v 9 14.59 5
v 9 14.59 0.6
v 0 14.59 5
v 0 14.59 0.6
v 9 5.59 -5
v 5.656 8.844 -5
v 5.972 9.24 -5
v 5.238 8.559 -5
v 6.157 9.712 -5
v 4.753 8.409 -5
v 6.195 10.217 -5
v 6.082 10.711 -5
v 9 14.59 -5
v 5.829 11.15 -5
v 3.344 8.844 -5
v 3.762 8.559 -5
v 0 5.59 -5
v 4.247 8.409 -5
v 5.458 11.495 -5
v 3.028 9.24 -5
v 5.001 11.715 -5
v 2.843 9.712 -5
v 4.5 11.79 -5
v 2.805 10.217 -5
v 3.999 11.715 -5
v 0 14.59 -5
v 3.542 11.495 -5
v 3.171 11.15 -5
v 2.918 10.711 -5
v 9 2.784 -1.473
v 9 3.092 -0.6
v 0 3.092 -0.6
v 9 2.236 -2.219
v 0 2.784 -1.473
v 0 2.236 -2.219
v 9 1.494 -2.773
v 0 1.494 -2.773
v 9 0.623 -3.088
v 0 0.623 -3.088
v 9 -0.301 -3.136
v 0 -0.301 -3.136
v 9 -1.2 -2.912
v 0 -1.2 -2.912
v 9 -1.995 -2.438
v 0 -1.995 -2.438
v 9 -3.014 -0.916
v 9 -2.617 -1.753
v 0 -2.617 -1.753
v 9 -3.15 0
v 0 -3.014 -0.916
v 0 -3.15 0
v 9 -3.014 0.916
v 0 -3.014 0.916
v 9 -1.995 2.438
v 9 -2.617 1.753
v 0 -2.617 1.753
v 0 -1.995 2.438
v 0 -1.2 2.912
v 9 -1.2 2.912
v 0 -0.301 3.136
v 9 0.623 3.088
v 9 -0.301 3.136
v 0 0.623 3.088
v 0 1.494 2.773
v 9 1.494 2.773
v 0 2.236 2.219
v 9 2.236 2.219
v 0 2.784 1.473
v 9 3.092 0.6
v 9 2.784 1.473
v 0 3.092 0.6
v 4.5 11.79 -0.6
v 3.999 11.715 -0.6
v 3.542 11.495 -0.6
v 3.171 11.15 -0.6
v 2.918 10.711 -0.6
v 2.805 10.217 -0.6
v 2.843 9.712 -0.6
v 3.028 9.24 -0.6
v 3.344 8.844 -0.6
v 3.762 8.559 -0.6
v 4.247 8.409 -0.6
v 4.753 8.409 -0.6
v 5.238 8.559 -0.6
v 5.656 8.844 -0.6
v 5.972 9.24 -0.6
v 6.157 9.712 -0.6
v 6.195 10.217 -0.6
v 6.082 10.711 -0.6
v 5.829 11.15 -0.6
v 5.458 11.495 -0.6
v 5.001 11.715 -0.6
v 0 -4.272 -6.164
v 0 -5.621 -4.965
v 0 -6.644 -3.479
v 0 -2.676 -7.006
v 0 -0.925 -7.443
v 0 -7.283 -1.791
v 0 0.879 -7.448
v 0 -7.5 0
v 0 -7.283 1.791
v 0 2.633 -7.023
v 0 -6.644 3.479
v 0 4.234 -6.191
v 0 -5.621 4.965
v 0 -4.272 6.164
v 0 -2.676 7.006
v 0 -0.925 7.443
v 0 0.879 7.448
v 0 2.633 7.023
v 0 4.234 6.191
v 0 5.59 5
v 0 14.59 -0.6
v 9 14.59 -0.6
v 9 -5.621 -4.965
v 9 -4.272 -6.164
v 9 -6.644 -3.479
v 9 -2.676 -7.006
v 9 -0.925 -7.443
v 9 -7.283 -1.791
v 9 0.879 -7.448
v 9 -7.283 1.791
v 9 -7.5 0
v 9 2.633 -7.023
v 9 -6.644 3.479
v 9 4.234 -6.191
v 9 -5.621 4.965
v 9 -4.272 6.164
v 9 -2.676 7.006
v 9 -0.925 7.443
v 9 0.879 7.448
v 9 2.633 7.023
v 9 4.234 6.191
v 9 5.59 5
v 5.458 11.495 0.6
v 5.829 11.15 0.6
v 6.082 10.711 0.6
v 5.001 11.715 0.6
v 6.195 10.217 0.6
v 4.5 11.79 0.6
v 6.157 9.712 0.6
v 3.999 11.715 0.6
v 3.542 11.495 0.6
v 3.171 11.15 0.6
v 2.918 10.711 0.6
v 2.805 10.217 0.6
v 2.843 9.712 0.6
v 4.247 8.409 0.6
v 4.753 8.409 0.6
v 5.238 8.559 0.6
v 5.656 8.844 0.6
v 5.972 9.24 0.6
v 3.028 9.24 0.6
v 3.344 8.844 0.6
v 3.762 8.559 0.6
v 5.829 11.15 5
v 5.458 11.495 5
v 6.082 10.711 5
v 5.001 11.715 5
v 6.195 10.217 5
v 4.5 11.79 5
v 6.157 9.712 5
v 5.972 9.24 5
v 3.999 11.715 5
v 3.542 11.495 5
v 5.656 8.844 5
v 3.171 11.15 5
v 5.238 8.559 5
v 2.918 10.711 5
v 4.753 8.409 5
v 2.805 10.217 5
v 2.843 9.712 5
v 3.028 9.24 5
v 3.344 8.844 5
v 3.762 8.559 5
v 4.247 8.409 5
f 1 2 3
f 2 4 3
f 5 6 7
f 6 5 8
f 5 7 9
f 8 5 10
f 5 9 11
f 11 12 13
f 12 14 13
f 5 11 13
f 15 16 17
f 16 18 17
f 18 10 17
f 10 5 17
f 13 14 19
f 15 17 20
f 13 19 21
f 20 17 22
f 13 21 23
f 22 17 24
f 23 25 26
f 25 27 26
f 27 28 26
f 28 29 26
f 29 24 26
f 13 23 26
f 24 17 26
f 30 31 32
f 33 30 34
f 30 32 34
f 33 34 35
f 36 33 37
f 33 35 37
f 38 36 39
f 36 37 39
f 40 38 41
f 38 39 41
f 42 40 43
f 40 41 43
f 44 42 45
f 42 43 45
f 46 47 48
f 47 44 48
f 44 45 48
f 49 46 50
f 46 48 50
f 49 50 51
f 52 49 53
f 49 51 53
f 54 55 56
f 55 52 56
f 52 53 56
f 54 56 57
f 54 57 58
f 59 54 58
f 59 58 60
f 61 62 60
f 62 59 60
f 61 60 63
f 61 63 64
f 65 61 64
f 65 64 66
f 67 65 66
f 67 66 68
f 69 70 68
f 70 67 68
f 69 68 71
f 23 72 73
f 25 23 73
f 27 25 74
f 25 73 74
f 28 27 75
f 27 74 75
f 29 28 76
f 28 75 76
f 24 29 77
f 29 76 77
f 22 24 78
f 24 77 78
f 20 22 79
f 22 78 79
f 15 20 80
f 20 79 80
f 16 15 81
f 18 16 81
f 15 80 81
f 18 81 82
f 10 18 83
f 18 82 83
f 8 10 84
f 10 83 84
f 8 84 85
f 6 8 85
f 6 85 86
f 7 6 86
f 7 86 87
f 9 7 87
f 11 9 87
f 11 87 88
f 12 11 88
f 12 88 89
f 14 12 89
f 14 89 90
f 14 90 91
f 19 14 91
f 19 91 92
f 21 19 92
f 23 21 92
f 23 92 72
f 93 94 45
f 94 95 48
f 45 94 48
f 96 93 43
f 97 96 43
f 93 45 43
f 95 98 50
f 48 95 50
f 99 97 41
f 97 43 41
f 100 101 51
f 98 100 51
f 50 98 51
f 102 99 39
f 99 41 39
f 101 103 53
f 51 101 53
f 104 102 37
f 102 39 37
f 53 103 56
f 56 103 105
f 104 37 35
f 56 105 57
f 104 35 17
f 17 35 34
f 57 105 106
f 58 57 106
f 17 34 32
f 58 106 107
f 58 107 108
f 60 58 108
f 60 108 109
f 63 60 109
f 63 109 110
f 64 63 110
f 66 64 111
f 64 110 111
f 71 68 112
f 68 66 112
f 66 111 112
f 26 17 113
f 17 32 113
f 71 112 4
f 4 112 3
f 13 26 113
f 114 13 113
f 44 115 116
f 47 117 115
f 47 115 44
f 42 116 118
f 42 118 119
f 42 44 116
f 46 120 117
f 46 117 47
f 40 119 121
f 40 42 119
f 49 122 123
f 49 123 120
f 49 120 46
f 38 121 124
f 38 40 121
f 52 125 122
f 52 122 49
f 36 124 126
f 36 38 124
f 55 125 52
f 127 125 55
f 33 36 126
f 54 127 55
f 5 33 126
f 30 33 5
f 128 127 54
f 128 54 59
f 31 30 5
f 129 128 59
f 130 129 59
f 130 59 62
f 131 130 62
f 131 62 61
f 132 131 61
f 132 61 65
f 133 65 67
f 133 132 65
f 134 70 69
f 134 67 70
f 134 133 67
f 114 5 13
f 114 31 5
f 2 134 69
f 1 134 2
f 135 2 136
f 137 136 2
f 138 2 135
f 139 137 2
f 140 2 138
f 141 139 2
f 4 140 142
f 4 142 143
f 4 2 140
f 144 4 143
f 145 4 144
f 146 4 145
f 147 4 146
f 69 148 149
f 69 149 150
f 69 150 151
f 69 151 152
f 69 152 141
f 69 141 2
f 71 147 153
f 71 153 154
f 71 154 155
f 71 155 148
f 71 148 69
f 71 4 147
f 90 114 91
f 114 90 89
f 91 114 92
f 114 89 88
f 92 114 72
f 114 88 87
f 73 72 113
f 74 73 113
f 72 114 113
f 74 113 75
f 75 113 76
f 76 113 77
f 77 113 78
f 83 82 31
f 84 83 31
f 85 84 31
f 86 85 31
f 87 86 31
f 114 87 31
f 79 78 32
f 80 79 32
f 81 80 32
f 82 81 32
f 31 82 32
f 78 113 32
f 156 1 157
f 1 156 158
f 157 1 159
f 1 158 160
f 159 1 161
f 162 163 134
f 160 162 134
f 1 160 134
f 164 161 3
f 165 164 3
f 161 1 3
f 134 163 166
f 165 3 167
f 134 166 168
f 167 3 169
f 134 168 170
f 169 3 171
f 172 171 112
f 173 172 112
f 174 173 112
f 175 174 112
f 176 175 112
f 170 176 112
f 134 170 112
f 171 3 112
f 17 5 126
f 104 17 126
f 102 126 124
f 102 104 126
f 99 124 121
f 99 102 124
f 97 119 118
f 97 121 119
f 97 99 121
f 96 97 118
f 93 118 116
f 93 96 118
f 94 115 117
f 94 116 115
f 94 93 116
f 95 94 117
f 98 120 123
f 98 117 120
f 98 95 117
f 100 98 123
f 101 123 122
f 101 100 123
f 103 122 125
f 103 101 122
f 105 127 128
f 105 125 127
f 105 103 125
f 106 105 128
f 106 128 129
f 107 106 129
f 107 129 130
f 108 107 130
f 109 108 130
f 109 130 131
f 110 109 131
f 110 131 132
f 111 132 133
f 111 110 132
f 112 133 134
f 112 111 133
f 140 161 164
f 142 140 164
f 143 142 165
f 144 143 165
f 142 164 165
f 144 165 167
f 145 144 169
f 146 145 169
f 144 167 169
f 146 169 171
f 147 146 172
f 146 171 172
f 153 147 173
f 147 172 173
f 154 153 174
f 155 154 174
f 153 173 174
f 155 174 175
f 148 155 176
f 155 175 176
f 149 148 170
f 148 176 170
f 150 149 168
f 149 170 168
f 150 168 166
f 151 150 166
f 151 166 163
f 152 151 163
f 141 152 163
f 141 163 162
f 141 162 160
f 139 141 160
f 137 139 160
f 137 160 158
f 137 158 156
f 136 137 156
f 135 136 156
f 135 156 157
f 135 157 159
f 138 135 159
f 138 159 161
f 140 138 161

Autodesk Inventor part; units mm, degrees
ref_plane "YZ Plane" through (0, 0, 0) normal (1, 0, 0) x (0, 1, 0)
ref_plane "XZ Plane" through (0, 0, 0) normal (0, 1, 0) x (-1, 0, 0)
ref_plane "XY Plane" through (0, 0, 0) normal (0, 0, 1) x (1, 0, 0)
sketch "スケッチ1" plane through (0, 0, 0) normal (1, 0, 0) x (0, 1, 0)
  circle A0 centre (0, 0) radius 3.15
  circle A1 centre (0, 0) radius 7.5
  line L0 (0, 0) -> (14.5902, 0)
  line L1 (14.5902, 5) -> (5.5902, 5)
  line L2 (5.5902, 5) -> (5.5902, -5)
  line L3 (5.5902, -5) -> (14.5902, -5)
  line L4 (14.5902, -5) -> (14.5902, 5)
  line L5 (14.5902, 0.6) -> (5.5902, 0.6)
  line L6 (5.5902, 0.6) -> (5.5902, -0.6)
  line L7 (5.5902, -0.6) -> (14.5902, -0.6)
  line L8 (14.5902, -0.6) -> (14.5902, 0.6)
  line L9 (5.5902, 0.6) -> (3.0923, 0.6)
  line L10 (5.5902, -0.6) -> (3.0923, -0.6)
  dimension "d1" = 15
  dimension "d0" = 6.3
  dimension "d2" = 1.2
  dimension "d3" = 9
  dimension "d4" = 10
extrude "押し出し1" add sketch "スケッチ1" along normal blind 9 contours A0 L10 L2 A1 L9 | L2 A1 L5 | L7 A1 L2 | L1 L4 L5 A1 | A1 L7 L4 L3
sketch "スケッチ2" plane through (0, 5.5902, -5) normal (0, 0, -1) x (-1, 0, 0)
  line L0 (0, 9) -> (-9, 9) projected
  line L1 (-4.5, 9) -> (-4.5, 3.2578)
  point P0 (0, -5.5902)
  point P1 (-4.5, 4.5)
  dimension "d7" = 4.5
hole "穴1" at (4.5, 10.0902, -5) direction (0, 0, 1) diameter 3.4 end through all
properties part number "SetCollar_d6"
